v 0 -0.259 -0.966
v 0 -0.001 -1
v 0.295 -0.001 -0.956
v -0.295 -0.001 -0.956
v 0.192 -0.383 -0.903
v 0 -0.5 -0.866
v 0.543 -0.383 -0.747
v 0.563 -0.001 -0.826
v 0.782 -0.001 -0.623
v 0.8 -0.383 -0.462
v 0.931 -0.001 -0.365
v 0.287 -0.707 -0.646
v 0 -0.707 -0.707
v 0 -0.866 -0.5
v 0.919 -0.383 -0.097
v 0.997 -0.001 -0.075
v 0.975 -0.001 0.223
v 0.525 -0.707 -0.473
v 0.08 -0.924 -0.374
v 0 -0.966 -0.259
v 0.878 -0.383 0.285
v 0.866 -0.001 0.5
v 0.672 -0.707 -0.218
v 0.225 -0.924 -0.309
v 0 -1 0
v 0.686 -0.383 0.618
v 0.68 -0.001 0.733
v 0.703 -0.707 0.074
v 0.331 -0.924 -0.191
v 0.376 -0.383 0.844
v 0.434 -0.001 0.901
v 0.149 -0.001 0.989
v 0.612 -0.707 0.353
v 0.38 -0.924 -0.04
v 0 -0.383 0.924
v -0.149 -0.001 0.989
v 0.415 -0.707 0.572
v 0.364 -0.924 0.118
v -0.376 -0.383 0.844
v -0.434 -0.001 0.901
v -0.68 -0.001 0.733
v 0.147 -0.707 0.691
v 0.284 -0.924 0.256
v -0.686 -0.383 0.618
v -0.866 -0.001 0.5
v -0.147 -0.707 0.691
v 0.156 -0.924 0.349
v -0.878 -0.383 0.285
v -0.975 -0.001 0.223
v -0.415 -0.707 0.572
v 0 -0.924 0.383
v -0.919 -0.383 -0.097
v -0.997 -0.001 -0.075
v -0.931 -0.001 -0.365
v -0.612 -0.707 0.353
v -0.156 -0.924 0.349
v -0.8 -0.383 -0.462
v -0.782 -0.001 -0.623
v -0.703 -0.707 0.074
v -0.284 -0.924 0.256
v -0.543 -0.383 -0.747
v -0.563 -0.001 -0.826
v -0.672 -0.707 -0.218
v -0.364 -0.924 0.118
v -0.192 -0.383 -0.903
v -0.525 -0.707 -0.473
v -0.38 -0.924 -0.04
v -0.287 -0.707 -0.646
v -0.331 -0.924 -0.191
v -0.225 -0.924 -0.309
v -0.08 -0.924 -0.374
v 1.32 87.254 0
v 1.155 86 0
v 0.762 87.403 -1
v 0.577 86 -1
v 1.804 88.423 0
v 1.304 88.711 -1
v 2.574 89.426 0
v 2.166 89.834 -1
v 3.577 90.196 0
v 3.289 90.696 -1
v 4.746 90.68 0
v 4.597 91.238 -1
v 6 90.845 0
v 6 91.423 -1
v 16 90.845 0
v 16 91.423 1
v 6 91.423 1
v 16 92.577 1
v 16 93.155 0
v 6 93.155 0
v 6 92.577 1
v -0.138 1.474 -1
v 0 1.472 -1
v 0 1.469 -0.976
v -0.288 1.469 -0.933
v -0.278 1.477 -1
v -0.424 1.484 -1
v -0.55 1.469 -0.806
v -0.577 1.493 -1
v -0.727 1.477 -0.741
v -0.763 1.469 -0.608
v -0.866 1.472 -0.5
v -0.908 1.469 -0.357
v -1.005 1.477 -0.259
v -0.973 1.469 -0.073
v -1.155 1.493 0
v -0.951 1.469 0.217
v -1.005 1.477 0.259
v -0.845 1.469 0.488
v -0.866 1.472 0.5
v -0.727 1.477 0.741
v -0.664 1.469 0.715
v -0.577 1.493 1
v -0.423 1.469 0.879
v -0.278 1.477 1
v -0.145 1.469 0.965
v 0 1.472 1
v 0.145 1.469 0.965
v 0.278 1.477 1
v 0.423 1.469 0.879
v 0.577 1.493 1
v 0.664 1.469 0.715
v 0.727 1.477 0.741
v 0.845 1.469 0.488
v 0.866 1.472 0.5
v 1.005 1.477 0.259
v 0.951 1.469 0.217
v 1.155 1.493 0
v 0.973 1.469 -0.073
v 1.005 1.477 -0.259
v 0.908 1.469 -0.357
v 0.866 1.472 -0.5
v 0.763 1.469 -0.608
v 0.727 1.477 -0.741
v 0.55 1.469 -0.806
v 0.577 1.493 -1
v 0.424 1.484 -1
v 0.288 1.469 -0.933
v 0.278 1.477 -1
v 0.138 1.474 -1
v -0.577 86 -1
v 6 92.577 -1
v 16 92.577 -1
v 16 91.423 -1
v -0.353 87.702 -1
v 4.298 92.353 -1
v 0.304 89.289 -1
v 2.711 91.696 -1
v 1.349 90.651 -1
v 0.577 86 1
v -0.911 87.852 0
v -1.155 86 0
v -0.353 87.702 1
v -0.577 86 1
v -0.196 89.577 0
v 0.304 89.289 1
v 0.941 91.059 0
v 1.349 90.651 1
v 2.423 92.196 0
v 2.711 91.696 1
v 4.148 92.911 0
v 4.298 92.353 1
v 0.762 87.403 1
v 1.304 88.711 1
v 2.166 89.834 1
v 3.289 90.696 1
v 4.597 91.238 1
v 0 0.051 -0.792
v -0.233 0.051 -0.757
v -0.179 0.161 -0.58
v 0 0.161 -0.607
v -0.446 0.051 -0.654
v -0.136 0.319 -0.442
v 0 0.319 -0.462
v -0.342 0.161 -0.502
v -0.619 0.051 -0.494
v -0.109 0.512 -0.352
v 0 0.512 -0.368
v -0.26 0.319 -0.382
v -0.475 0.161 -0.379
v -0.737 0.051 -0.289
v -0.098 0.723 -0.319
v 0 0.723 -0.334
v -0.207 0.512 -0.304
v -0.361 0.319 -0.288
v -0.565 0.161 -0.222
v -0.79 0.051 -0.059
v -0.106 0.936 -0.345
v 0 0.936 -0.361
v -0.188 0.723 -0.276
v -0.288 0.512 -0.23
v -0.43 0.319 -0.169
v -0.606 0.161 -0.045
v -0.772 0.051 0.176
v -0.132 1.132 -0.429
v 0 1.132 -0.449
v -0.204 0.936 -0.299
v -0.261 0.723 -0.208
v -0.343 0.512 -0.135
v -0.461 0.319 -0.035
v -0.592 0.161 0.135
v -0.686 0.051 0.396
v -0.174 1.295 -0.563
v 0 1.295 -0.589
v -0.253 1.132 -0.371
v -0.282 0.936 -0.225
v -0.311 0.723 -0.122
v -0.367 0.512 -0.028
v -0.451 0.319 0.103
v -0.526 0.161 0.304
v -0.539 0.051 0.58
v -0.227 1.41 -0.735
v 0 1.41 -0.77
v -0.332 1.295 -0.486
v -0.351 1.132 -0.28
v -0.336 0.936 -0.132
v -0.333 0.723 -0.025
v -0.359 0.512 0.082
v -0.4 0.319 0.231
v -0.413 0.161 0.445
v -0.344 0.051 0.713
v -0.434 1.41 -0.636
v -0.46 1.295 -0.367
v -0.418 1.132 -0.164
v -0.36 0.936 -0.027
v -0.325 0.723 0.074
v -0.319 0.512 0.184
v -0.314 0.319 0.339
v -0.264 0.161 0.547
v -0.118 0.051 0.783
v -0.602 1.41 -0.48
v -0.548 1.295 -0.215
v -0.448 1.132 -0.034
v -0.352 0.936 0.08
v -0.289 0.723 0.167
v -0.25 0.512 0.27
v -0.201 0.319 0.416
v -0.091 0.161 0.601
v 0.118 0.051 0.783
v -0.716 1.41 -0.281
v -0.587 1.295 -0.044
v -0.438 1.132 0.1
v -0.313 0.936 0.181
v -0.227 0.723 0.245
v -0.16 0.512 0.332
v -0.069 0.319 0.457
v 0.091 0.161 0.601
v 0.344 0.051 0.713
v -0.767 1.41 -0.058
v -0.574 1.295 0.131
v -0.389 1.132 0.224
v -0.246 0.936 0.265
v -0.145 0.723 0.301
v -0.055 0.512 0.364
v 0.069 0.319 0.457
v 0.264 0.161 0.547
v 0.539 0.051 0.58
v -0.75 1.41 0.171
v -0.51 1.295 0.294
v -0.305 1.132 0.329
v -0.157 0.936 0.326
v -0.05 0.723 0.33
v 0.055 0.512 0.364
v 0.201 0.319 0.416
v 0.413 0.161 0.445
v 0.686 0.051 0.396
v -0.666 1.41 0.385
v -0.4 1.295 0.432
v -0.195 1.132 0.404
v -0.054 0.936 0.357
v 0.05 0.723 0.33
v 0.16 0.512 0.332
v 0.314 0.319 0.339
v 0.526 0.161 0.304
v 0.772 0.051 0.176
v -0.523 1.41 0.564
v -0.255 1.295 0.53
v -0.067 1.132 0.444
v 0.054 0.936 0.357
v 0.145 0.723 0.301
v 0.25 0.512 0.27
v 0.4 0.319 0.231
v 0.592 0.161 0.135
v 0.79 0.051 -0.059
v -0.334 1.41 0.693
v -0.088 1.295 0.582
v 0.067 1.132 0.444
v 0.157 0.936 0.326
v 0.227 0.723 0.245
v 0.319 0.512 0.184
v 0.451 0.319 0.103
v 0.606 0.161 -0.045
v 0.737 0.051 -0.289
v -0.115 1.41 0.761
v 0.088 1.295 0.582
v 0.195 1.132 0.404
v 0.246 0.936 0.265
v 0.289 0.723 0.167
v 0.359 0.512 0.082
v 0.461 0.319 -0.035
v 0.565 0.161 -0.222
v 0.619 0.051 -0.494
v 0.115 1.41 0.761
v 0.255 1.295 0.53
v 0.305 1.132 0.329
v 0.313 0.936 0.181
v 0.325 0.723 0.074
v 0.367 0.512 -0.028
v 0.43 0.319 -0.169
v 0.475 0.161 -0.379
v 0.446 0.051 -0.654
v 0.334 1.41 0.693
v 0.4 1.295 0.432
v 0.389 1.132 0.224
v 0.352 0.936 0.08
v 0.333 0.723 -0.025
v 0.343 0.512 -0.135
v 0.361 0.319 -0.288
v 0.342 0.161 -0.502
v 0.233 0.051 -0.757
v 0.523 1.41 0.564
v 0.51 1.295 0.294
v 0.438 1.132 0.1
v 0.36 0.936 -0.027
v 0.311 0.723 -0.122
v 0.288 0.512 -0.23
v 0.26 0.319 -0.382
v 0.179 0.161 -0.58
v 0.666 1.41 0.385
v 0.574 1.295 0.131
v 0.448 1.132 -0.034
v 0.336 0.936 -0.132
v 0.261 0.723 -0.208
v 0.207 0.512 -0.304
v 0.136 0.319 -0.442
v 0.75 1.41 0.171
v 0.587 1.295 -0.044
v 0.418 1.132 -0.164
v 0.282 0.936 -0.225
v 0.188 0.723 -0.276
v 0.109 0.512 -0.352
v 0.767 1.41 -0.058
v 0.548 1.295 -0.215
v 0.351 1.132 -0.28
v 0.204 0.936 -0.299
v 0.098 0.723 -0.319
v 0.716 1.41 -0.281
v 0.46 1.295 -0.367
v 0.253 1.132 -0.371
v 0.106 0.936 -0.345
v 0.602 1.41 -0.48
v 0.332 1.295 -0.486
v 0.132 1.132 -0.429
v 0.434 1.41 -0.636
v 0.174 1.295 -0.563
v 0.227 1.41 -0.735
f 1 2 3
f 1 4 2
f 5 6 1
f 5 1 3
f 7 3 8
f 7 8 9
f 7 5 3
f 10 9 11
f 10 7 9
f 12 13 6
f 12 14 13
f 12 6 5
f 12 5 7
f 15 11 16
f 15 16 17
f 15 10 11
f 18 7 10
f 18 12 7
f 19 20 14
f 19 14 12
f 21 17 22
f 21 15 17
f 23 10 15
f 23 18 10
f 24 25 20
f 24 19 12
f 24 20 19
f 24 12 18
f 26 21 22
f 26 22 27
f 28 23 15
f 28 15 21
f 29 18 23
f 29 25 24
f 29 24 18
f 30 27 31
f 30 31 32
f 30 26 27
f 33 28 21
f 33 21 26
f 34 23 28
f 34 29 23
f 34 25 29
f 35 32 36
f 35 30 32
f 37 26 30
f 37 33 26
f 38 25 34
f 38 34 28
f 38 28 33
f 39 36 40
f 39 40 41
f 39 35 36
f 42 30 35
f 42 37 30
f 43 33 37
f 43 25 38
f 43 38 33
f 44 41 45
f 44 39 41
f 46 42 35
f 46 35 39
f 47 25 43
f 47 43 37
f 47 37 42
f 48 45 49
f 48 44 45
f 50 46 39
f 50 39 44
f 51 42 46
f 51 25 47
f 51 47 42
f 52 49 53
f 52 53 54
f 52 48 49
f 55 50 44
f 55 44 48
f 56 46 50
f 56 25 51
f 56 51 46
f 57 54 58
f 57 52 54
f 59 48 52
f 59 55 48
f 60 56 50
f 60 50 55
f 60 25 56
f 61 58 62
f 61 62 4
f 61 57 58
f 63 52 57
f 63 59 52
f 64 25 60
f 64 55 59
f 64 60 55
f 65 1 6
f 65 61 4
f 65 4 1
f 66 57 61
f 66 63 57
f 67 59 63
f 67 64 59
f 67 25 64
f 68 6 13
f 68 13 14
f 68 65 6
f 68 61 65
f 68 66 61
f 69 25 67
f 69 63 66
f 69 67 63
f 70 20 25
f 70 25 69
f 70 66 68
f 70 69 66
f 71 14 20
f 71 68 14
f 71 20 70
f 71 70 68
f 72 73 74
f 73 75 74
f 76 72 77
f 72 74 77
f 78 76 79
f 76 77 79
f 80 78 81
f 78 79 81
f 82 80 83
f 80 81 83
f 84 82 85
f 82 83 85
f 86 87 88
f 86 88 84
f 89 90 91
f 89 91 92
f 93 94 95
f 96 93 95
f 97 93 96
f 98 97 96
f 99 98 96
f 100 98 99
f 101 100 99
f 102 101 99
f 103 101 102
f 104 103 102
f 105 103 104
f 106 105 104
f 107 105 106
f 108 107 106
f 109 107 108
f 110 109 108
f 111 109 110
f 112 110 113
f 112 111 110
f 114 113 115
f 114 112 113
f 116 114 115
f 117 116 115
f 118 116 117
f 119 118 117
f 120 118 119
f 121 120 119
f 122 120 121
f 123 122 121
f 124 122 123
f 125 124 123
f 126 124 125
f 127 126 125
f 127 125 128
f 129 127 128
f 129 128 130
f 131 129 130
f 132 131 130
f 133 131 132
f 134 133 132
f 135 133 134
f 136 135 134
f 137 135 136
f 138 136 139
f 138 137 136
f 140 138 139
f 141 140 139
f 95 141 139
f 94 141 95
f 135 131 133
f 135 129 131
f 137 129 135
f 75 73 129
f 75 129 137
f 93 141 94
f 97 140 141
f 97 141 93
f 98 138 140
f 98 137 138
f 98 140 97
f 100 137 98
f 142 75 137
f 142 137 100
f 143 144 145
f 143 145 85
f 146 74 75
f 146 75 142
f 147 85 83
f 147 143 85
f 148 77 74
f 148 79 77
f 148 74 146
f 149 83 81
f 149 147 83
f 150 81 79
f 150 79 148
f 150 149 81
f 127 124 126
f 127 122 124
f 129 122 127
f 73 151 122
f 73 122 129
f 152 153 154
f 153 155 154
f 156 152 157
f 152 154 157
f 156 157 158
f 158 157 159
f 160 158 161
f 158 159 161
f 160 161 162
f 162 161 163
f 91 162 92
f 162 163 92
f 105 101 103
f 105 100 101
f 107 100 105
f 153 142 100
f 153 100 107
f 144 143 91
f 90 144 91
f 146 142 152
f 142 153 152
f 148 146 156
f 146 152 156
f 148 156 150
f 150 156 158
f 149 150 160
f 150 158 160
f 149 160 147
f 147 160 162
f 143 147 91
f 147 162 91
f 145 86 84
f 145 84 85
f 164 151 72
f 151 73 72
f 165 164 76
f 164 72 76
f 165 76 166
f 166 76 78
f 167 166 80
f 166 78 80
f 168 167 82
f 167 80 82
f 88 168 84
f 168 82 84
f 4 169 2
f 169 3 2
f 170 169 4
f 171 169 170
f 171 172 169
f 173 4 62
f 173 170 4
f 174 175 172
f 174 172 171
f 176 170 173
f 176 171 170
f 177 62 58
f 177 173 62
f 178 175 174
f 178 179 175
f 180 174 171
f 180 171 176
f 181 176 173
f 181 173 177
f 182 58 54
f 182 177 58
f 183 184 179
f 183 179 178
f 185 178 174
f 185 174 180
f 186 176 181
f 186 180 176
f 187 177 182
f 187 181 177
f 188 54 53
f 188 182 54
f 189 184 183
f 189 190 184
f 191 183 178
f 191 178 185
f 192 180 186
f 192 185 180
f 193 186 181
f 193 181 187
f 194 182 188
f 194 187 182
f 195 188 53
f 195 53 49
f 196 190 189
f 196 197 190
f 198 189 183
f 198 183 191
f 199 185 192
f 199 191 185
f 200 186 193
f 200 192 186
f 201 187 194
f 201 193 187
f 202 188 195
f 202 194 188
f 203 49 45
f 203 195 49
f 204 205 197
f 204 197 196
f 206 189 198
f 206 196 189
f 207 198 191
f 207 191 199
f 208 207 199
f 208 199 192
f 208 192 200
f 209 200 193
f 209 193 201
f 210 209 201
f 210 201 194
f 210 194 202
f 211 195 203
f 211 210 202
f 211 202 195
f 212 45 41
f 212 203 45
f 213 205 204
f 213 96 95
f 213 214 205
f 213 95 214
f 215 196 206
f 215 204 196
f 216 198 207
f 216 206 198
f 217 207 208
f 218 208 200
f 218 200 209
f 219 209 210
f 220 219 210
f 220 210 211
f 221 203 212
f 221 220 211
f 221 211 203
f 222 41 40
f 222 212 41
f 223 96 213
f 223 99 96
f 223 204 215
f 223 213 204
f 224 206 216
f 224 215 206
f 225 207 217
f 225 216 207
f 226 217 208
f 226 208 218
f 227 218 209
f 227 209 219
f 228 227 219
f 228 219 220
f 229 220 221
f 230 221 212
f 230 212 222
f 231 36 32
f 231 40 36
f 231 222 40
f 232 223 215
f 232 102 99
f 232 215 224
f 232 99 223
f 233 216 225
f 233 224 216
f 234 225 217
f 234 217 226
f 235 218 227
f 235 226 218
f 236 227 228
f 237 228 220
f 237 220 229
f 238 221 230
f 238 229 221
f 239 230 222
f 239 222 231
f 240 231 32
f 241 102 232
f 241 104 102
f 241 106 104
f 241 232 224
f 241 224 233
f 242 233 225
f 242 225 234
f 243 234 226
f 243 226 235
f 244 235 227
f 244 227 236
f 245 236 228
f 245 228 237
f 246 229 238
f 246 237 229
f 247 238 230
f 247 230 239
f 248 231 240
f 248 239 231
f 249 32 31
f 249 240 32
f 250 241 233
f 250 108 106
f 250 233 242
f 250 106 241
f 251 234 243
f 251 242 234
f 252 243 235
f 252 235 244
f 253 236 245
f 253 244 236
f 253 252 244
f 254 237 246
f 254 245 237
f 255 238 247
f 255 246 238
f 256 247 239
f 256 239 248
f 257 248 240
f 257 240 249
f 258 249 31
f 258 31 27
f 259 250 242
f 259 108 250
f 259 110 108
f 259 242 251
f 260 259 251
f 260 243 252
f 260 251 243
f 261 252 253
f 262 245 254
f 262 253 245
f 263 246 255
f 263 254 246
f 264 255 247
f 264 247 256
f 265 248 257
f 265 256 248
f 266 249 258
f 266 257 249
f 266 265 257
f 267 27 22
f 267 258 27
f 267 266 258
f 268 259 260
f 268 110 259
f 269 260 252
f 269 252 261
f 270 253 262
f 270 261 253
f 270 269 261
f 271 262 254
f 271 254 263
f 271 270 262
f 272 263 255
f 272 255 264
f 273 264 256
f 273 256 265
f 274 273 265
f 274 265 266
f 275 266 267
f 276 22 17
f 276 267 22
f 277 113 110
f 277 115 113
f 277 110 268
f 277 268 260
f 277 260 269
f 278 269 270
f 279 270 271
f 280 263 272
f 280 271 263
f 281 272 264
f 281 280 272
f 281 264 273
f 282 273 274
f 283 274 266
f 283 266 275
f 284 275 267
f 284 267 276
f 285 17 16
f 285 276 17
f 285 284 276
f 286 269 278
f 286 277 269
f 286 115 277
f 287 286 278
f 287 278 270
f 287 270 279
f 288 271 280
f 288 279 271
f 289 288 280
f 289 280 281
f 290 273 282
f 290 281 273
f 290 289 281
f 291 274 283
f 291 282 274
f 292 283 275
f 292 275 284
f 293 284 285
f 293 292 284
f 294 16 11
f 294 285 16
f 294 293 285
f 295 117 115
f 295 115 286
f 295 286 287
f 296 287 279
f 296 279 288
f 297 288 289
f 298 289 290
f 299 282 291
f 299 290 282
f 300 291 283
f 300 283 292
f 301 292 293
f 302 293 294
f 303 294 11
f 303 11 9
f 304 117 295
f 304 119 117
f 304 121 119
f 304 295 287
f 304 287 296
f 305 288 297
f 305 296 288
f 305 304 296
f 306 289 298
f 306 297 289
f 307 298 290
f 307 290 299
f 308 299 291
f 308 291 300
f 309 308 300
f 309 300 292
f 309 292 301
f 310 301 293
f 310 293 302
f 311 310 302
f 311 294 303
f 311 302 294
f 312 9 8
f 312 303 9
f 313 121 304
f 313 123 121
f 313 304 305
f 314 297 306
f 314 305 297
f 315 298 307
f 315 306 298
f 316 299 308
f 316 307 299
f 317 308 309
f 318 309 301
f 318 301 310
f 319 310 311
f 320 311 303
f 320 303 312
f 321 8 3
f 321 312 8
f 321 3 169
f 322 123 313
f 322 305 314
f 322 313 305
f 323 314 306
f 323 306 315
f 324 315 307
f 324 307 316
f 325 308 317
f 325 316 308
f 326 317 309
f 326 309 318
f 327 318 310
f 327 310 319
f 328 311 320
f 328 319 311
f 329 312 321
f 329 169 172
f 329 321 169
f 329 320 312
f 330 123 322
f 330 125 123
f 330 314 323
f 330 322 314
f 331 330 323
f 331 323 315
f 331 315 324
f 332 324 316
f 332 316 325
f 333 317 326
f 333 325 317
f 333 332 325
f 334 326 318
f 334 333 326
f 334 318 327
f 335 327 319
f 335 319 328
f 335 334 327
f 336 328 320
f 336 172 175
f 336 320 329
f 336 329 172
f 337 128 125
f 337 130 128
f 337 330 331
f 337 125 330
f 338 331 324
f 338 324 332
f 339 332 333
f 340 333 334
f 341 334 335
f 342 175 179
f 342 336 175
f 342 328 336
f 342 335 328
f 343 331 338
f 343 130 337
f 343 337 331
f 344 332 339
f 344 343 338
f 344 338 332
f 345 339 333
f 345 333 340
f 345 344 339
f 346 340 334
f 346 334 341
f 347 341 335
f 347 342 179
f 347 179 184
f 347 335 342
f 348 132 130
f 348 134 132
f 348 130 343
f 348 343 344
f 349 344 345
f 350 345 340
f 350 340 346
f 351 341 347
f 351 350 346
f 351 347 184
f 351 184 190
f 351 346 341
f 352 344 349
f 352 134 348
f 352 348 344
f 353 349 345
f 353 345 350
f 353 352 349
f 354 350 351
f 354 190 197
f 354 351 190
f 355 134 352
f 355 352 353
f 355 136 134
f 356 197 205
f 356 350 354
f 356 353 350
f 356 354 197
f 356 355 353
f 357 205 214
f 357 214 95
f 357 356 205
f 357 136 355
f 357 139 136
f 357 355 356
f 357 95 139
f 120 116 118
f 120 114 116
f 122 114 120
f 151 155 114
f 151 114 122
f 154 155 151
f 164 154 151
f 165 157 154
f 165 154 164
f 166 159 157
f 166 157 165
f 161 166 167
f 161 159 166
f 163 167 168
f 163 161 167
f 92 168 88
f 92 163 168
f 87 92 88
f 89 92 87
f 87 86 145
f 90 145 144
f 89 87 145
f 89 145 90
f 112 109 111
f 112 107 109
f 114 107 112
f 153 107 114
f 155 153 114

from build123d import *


with BuildPart() as part:
    # Austragung4: sweep along a path in Skizze1
    with BuildLine(Plane.XY) as austragung4_path:
        Line((0, 0), (0, 86))
        ThreePointArc((0, 86), (1.7573593128807152, 90.24264068711929), (6, 92.00000000000001))
        Line((6, 92.00000000000001), (16, 92))
    # Skizze3 → Austragung4 (sweep)
    with BuildSketch(Plane(origin=(0, 0, 0), x_dir=(1, 0, 0), z_dir=(0, 1, 0))):
        Polygon((-0.5773502691896251, 1), (-1.1547005383792512, -1.7e-16), (-0.577350269189625, -1.0000000000000009), (0.5773502691896264, -1.0000000000000007), (1.1547005383792524, -2.9e-16), (0.5773502691896265, 1), align=None)
    sweep(path=austragung4_path.line)

    # Skizze6 → Rotation5 (revolve)
    with BuildSketch(Plane(origin=(0, 0, 0), x_dir=(0, 0, -1), z_dir=(1, 0, 0))):
        with BuildLine():
            Line((1.08e-15, -1.0000000000000007), (1.08e-15, 1.0000000000000007))
            ThreePointArc((1.08e-15, 1.0000000000000007), (1.0000000000000007, 0), (1.08e-15, -1.0000000000000007))
        make_face()
    revolve(axis=Axis((0, 7.810357944094903, -1.48e-15), (0, -1, 0)))

    # Skizze8 → Schnitt-Rotation1 (revolve, cut)
    with BuildSketch(Plane.XY, mode=Mode.PRIVATE) as schnitt_rotation1_sk:
        with BuildLine():
            Line((-3.0586465116527903, -0.25356146909949984), (-1.1547005383792512, 0))
            ThreePointArc((-1.1547005383792512, 0), (-0.33900397376978075, 0.6461318381885482), (-0.9758944689717856, 1.469064238181372))
            Line((-0.9758944689717856, 1.469064238181372), (-3.0586465116527903, 1.7464385309005002))
            Line((-3.0586465116527903, 1.7464385309005002), (-3.0586465116527903, -0.25356146909949984))
        make_face()
    revolve(schnitt_rotation1_sk.sketch.rotate(Axis((0, 0, 0), (0, 1, 0)), 270), axis=Axis((0, 0, 0), (0, 1, 0)), mode=Mode.SUBTRACT)


solid = part.part
